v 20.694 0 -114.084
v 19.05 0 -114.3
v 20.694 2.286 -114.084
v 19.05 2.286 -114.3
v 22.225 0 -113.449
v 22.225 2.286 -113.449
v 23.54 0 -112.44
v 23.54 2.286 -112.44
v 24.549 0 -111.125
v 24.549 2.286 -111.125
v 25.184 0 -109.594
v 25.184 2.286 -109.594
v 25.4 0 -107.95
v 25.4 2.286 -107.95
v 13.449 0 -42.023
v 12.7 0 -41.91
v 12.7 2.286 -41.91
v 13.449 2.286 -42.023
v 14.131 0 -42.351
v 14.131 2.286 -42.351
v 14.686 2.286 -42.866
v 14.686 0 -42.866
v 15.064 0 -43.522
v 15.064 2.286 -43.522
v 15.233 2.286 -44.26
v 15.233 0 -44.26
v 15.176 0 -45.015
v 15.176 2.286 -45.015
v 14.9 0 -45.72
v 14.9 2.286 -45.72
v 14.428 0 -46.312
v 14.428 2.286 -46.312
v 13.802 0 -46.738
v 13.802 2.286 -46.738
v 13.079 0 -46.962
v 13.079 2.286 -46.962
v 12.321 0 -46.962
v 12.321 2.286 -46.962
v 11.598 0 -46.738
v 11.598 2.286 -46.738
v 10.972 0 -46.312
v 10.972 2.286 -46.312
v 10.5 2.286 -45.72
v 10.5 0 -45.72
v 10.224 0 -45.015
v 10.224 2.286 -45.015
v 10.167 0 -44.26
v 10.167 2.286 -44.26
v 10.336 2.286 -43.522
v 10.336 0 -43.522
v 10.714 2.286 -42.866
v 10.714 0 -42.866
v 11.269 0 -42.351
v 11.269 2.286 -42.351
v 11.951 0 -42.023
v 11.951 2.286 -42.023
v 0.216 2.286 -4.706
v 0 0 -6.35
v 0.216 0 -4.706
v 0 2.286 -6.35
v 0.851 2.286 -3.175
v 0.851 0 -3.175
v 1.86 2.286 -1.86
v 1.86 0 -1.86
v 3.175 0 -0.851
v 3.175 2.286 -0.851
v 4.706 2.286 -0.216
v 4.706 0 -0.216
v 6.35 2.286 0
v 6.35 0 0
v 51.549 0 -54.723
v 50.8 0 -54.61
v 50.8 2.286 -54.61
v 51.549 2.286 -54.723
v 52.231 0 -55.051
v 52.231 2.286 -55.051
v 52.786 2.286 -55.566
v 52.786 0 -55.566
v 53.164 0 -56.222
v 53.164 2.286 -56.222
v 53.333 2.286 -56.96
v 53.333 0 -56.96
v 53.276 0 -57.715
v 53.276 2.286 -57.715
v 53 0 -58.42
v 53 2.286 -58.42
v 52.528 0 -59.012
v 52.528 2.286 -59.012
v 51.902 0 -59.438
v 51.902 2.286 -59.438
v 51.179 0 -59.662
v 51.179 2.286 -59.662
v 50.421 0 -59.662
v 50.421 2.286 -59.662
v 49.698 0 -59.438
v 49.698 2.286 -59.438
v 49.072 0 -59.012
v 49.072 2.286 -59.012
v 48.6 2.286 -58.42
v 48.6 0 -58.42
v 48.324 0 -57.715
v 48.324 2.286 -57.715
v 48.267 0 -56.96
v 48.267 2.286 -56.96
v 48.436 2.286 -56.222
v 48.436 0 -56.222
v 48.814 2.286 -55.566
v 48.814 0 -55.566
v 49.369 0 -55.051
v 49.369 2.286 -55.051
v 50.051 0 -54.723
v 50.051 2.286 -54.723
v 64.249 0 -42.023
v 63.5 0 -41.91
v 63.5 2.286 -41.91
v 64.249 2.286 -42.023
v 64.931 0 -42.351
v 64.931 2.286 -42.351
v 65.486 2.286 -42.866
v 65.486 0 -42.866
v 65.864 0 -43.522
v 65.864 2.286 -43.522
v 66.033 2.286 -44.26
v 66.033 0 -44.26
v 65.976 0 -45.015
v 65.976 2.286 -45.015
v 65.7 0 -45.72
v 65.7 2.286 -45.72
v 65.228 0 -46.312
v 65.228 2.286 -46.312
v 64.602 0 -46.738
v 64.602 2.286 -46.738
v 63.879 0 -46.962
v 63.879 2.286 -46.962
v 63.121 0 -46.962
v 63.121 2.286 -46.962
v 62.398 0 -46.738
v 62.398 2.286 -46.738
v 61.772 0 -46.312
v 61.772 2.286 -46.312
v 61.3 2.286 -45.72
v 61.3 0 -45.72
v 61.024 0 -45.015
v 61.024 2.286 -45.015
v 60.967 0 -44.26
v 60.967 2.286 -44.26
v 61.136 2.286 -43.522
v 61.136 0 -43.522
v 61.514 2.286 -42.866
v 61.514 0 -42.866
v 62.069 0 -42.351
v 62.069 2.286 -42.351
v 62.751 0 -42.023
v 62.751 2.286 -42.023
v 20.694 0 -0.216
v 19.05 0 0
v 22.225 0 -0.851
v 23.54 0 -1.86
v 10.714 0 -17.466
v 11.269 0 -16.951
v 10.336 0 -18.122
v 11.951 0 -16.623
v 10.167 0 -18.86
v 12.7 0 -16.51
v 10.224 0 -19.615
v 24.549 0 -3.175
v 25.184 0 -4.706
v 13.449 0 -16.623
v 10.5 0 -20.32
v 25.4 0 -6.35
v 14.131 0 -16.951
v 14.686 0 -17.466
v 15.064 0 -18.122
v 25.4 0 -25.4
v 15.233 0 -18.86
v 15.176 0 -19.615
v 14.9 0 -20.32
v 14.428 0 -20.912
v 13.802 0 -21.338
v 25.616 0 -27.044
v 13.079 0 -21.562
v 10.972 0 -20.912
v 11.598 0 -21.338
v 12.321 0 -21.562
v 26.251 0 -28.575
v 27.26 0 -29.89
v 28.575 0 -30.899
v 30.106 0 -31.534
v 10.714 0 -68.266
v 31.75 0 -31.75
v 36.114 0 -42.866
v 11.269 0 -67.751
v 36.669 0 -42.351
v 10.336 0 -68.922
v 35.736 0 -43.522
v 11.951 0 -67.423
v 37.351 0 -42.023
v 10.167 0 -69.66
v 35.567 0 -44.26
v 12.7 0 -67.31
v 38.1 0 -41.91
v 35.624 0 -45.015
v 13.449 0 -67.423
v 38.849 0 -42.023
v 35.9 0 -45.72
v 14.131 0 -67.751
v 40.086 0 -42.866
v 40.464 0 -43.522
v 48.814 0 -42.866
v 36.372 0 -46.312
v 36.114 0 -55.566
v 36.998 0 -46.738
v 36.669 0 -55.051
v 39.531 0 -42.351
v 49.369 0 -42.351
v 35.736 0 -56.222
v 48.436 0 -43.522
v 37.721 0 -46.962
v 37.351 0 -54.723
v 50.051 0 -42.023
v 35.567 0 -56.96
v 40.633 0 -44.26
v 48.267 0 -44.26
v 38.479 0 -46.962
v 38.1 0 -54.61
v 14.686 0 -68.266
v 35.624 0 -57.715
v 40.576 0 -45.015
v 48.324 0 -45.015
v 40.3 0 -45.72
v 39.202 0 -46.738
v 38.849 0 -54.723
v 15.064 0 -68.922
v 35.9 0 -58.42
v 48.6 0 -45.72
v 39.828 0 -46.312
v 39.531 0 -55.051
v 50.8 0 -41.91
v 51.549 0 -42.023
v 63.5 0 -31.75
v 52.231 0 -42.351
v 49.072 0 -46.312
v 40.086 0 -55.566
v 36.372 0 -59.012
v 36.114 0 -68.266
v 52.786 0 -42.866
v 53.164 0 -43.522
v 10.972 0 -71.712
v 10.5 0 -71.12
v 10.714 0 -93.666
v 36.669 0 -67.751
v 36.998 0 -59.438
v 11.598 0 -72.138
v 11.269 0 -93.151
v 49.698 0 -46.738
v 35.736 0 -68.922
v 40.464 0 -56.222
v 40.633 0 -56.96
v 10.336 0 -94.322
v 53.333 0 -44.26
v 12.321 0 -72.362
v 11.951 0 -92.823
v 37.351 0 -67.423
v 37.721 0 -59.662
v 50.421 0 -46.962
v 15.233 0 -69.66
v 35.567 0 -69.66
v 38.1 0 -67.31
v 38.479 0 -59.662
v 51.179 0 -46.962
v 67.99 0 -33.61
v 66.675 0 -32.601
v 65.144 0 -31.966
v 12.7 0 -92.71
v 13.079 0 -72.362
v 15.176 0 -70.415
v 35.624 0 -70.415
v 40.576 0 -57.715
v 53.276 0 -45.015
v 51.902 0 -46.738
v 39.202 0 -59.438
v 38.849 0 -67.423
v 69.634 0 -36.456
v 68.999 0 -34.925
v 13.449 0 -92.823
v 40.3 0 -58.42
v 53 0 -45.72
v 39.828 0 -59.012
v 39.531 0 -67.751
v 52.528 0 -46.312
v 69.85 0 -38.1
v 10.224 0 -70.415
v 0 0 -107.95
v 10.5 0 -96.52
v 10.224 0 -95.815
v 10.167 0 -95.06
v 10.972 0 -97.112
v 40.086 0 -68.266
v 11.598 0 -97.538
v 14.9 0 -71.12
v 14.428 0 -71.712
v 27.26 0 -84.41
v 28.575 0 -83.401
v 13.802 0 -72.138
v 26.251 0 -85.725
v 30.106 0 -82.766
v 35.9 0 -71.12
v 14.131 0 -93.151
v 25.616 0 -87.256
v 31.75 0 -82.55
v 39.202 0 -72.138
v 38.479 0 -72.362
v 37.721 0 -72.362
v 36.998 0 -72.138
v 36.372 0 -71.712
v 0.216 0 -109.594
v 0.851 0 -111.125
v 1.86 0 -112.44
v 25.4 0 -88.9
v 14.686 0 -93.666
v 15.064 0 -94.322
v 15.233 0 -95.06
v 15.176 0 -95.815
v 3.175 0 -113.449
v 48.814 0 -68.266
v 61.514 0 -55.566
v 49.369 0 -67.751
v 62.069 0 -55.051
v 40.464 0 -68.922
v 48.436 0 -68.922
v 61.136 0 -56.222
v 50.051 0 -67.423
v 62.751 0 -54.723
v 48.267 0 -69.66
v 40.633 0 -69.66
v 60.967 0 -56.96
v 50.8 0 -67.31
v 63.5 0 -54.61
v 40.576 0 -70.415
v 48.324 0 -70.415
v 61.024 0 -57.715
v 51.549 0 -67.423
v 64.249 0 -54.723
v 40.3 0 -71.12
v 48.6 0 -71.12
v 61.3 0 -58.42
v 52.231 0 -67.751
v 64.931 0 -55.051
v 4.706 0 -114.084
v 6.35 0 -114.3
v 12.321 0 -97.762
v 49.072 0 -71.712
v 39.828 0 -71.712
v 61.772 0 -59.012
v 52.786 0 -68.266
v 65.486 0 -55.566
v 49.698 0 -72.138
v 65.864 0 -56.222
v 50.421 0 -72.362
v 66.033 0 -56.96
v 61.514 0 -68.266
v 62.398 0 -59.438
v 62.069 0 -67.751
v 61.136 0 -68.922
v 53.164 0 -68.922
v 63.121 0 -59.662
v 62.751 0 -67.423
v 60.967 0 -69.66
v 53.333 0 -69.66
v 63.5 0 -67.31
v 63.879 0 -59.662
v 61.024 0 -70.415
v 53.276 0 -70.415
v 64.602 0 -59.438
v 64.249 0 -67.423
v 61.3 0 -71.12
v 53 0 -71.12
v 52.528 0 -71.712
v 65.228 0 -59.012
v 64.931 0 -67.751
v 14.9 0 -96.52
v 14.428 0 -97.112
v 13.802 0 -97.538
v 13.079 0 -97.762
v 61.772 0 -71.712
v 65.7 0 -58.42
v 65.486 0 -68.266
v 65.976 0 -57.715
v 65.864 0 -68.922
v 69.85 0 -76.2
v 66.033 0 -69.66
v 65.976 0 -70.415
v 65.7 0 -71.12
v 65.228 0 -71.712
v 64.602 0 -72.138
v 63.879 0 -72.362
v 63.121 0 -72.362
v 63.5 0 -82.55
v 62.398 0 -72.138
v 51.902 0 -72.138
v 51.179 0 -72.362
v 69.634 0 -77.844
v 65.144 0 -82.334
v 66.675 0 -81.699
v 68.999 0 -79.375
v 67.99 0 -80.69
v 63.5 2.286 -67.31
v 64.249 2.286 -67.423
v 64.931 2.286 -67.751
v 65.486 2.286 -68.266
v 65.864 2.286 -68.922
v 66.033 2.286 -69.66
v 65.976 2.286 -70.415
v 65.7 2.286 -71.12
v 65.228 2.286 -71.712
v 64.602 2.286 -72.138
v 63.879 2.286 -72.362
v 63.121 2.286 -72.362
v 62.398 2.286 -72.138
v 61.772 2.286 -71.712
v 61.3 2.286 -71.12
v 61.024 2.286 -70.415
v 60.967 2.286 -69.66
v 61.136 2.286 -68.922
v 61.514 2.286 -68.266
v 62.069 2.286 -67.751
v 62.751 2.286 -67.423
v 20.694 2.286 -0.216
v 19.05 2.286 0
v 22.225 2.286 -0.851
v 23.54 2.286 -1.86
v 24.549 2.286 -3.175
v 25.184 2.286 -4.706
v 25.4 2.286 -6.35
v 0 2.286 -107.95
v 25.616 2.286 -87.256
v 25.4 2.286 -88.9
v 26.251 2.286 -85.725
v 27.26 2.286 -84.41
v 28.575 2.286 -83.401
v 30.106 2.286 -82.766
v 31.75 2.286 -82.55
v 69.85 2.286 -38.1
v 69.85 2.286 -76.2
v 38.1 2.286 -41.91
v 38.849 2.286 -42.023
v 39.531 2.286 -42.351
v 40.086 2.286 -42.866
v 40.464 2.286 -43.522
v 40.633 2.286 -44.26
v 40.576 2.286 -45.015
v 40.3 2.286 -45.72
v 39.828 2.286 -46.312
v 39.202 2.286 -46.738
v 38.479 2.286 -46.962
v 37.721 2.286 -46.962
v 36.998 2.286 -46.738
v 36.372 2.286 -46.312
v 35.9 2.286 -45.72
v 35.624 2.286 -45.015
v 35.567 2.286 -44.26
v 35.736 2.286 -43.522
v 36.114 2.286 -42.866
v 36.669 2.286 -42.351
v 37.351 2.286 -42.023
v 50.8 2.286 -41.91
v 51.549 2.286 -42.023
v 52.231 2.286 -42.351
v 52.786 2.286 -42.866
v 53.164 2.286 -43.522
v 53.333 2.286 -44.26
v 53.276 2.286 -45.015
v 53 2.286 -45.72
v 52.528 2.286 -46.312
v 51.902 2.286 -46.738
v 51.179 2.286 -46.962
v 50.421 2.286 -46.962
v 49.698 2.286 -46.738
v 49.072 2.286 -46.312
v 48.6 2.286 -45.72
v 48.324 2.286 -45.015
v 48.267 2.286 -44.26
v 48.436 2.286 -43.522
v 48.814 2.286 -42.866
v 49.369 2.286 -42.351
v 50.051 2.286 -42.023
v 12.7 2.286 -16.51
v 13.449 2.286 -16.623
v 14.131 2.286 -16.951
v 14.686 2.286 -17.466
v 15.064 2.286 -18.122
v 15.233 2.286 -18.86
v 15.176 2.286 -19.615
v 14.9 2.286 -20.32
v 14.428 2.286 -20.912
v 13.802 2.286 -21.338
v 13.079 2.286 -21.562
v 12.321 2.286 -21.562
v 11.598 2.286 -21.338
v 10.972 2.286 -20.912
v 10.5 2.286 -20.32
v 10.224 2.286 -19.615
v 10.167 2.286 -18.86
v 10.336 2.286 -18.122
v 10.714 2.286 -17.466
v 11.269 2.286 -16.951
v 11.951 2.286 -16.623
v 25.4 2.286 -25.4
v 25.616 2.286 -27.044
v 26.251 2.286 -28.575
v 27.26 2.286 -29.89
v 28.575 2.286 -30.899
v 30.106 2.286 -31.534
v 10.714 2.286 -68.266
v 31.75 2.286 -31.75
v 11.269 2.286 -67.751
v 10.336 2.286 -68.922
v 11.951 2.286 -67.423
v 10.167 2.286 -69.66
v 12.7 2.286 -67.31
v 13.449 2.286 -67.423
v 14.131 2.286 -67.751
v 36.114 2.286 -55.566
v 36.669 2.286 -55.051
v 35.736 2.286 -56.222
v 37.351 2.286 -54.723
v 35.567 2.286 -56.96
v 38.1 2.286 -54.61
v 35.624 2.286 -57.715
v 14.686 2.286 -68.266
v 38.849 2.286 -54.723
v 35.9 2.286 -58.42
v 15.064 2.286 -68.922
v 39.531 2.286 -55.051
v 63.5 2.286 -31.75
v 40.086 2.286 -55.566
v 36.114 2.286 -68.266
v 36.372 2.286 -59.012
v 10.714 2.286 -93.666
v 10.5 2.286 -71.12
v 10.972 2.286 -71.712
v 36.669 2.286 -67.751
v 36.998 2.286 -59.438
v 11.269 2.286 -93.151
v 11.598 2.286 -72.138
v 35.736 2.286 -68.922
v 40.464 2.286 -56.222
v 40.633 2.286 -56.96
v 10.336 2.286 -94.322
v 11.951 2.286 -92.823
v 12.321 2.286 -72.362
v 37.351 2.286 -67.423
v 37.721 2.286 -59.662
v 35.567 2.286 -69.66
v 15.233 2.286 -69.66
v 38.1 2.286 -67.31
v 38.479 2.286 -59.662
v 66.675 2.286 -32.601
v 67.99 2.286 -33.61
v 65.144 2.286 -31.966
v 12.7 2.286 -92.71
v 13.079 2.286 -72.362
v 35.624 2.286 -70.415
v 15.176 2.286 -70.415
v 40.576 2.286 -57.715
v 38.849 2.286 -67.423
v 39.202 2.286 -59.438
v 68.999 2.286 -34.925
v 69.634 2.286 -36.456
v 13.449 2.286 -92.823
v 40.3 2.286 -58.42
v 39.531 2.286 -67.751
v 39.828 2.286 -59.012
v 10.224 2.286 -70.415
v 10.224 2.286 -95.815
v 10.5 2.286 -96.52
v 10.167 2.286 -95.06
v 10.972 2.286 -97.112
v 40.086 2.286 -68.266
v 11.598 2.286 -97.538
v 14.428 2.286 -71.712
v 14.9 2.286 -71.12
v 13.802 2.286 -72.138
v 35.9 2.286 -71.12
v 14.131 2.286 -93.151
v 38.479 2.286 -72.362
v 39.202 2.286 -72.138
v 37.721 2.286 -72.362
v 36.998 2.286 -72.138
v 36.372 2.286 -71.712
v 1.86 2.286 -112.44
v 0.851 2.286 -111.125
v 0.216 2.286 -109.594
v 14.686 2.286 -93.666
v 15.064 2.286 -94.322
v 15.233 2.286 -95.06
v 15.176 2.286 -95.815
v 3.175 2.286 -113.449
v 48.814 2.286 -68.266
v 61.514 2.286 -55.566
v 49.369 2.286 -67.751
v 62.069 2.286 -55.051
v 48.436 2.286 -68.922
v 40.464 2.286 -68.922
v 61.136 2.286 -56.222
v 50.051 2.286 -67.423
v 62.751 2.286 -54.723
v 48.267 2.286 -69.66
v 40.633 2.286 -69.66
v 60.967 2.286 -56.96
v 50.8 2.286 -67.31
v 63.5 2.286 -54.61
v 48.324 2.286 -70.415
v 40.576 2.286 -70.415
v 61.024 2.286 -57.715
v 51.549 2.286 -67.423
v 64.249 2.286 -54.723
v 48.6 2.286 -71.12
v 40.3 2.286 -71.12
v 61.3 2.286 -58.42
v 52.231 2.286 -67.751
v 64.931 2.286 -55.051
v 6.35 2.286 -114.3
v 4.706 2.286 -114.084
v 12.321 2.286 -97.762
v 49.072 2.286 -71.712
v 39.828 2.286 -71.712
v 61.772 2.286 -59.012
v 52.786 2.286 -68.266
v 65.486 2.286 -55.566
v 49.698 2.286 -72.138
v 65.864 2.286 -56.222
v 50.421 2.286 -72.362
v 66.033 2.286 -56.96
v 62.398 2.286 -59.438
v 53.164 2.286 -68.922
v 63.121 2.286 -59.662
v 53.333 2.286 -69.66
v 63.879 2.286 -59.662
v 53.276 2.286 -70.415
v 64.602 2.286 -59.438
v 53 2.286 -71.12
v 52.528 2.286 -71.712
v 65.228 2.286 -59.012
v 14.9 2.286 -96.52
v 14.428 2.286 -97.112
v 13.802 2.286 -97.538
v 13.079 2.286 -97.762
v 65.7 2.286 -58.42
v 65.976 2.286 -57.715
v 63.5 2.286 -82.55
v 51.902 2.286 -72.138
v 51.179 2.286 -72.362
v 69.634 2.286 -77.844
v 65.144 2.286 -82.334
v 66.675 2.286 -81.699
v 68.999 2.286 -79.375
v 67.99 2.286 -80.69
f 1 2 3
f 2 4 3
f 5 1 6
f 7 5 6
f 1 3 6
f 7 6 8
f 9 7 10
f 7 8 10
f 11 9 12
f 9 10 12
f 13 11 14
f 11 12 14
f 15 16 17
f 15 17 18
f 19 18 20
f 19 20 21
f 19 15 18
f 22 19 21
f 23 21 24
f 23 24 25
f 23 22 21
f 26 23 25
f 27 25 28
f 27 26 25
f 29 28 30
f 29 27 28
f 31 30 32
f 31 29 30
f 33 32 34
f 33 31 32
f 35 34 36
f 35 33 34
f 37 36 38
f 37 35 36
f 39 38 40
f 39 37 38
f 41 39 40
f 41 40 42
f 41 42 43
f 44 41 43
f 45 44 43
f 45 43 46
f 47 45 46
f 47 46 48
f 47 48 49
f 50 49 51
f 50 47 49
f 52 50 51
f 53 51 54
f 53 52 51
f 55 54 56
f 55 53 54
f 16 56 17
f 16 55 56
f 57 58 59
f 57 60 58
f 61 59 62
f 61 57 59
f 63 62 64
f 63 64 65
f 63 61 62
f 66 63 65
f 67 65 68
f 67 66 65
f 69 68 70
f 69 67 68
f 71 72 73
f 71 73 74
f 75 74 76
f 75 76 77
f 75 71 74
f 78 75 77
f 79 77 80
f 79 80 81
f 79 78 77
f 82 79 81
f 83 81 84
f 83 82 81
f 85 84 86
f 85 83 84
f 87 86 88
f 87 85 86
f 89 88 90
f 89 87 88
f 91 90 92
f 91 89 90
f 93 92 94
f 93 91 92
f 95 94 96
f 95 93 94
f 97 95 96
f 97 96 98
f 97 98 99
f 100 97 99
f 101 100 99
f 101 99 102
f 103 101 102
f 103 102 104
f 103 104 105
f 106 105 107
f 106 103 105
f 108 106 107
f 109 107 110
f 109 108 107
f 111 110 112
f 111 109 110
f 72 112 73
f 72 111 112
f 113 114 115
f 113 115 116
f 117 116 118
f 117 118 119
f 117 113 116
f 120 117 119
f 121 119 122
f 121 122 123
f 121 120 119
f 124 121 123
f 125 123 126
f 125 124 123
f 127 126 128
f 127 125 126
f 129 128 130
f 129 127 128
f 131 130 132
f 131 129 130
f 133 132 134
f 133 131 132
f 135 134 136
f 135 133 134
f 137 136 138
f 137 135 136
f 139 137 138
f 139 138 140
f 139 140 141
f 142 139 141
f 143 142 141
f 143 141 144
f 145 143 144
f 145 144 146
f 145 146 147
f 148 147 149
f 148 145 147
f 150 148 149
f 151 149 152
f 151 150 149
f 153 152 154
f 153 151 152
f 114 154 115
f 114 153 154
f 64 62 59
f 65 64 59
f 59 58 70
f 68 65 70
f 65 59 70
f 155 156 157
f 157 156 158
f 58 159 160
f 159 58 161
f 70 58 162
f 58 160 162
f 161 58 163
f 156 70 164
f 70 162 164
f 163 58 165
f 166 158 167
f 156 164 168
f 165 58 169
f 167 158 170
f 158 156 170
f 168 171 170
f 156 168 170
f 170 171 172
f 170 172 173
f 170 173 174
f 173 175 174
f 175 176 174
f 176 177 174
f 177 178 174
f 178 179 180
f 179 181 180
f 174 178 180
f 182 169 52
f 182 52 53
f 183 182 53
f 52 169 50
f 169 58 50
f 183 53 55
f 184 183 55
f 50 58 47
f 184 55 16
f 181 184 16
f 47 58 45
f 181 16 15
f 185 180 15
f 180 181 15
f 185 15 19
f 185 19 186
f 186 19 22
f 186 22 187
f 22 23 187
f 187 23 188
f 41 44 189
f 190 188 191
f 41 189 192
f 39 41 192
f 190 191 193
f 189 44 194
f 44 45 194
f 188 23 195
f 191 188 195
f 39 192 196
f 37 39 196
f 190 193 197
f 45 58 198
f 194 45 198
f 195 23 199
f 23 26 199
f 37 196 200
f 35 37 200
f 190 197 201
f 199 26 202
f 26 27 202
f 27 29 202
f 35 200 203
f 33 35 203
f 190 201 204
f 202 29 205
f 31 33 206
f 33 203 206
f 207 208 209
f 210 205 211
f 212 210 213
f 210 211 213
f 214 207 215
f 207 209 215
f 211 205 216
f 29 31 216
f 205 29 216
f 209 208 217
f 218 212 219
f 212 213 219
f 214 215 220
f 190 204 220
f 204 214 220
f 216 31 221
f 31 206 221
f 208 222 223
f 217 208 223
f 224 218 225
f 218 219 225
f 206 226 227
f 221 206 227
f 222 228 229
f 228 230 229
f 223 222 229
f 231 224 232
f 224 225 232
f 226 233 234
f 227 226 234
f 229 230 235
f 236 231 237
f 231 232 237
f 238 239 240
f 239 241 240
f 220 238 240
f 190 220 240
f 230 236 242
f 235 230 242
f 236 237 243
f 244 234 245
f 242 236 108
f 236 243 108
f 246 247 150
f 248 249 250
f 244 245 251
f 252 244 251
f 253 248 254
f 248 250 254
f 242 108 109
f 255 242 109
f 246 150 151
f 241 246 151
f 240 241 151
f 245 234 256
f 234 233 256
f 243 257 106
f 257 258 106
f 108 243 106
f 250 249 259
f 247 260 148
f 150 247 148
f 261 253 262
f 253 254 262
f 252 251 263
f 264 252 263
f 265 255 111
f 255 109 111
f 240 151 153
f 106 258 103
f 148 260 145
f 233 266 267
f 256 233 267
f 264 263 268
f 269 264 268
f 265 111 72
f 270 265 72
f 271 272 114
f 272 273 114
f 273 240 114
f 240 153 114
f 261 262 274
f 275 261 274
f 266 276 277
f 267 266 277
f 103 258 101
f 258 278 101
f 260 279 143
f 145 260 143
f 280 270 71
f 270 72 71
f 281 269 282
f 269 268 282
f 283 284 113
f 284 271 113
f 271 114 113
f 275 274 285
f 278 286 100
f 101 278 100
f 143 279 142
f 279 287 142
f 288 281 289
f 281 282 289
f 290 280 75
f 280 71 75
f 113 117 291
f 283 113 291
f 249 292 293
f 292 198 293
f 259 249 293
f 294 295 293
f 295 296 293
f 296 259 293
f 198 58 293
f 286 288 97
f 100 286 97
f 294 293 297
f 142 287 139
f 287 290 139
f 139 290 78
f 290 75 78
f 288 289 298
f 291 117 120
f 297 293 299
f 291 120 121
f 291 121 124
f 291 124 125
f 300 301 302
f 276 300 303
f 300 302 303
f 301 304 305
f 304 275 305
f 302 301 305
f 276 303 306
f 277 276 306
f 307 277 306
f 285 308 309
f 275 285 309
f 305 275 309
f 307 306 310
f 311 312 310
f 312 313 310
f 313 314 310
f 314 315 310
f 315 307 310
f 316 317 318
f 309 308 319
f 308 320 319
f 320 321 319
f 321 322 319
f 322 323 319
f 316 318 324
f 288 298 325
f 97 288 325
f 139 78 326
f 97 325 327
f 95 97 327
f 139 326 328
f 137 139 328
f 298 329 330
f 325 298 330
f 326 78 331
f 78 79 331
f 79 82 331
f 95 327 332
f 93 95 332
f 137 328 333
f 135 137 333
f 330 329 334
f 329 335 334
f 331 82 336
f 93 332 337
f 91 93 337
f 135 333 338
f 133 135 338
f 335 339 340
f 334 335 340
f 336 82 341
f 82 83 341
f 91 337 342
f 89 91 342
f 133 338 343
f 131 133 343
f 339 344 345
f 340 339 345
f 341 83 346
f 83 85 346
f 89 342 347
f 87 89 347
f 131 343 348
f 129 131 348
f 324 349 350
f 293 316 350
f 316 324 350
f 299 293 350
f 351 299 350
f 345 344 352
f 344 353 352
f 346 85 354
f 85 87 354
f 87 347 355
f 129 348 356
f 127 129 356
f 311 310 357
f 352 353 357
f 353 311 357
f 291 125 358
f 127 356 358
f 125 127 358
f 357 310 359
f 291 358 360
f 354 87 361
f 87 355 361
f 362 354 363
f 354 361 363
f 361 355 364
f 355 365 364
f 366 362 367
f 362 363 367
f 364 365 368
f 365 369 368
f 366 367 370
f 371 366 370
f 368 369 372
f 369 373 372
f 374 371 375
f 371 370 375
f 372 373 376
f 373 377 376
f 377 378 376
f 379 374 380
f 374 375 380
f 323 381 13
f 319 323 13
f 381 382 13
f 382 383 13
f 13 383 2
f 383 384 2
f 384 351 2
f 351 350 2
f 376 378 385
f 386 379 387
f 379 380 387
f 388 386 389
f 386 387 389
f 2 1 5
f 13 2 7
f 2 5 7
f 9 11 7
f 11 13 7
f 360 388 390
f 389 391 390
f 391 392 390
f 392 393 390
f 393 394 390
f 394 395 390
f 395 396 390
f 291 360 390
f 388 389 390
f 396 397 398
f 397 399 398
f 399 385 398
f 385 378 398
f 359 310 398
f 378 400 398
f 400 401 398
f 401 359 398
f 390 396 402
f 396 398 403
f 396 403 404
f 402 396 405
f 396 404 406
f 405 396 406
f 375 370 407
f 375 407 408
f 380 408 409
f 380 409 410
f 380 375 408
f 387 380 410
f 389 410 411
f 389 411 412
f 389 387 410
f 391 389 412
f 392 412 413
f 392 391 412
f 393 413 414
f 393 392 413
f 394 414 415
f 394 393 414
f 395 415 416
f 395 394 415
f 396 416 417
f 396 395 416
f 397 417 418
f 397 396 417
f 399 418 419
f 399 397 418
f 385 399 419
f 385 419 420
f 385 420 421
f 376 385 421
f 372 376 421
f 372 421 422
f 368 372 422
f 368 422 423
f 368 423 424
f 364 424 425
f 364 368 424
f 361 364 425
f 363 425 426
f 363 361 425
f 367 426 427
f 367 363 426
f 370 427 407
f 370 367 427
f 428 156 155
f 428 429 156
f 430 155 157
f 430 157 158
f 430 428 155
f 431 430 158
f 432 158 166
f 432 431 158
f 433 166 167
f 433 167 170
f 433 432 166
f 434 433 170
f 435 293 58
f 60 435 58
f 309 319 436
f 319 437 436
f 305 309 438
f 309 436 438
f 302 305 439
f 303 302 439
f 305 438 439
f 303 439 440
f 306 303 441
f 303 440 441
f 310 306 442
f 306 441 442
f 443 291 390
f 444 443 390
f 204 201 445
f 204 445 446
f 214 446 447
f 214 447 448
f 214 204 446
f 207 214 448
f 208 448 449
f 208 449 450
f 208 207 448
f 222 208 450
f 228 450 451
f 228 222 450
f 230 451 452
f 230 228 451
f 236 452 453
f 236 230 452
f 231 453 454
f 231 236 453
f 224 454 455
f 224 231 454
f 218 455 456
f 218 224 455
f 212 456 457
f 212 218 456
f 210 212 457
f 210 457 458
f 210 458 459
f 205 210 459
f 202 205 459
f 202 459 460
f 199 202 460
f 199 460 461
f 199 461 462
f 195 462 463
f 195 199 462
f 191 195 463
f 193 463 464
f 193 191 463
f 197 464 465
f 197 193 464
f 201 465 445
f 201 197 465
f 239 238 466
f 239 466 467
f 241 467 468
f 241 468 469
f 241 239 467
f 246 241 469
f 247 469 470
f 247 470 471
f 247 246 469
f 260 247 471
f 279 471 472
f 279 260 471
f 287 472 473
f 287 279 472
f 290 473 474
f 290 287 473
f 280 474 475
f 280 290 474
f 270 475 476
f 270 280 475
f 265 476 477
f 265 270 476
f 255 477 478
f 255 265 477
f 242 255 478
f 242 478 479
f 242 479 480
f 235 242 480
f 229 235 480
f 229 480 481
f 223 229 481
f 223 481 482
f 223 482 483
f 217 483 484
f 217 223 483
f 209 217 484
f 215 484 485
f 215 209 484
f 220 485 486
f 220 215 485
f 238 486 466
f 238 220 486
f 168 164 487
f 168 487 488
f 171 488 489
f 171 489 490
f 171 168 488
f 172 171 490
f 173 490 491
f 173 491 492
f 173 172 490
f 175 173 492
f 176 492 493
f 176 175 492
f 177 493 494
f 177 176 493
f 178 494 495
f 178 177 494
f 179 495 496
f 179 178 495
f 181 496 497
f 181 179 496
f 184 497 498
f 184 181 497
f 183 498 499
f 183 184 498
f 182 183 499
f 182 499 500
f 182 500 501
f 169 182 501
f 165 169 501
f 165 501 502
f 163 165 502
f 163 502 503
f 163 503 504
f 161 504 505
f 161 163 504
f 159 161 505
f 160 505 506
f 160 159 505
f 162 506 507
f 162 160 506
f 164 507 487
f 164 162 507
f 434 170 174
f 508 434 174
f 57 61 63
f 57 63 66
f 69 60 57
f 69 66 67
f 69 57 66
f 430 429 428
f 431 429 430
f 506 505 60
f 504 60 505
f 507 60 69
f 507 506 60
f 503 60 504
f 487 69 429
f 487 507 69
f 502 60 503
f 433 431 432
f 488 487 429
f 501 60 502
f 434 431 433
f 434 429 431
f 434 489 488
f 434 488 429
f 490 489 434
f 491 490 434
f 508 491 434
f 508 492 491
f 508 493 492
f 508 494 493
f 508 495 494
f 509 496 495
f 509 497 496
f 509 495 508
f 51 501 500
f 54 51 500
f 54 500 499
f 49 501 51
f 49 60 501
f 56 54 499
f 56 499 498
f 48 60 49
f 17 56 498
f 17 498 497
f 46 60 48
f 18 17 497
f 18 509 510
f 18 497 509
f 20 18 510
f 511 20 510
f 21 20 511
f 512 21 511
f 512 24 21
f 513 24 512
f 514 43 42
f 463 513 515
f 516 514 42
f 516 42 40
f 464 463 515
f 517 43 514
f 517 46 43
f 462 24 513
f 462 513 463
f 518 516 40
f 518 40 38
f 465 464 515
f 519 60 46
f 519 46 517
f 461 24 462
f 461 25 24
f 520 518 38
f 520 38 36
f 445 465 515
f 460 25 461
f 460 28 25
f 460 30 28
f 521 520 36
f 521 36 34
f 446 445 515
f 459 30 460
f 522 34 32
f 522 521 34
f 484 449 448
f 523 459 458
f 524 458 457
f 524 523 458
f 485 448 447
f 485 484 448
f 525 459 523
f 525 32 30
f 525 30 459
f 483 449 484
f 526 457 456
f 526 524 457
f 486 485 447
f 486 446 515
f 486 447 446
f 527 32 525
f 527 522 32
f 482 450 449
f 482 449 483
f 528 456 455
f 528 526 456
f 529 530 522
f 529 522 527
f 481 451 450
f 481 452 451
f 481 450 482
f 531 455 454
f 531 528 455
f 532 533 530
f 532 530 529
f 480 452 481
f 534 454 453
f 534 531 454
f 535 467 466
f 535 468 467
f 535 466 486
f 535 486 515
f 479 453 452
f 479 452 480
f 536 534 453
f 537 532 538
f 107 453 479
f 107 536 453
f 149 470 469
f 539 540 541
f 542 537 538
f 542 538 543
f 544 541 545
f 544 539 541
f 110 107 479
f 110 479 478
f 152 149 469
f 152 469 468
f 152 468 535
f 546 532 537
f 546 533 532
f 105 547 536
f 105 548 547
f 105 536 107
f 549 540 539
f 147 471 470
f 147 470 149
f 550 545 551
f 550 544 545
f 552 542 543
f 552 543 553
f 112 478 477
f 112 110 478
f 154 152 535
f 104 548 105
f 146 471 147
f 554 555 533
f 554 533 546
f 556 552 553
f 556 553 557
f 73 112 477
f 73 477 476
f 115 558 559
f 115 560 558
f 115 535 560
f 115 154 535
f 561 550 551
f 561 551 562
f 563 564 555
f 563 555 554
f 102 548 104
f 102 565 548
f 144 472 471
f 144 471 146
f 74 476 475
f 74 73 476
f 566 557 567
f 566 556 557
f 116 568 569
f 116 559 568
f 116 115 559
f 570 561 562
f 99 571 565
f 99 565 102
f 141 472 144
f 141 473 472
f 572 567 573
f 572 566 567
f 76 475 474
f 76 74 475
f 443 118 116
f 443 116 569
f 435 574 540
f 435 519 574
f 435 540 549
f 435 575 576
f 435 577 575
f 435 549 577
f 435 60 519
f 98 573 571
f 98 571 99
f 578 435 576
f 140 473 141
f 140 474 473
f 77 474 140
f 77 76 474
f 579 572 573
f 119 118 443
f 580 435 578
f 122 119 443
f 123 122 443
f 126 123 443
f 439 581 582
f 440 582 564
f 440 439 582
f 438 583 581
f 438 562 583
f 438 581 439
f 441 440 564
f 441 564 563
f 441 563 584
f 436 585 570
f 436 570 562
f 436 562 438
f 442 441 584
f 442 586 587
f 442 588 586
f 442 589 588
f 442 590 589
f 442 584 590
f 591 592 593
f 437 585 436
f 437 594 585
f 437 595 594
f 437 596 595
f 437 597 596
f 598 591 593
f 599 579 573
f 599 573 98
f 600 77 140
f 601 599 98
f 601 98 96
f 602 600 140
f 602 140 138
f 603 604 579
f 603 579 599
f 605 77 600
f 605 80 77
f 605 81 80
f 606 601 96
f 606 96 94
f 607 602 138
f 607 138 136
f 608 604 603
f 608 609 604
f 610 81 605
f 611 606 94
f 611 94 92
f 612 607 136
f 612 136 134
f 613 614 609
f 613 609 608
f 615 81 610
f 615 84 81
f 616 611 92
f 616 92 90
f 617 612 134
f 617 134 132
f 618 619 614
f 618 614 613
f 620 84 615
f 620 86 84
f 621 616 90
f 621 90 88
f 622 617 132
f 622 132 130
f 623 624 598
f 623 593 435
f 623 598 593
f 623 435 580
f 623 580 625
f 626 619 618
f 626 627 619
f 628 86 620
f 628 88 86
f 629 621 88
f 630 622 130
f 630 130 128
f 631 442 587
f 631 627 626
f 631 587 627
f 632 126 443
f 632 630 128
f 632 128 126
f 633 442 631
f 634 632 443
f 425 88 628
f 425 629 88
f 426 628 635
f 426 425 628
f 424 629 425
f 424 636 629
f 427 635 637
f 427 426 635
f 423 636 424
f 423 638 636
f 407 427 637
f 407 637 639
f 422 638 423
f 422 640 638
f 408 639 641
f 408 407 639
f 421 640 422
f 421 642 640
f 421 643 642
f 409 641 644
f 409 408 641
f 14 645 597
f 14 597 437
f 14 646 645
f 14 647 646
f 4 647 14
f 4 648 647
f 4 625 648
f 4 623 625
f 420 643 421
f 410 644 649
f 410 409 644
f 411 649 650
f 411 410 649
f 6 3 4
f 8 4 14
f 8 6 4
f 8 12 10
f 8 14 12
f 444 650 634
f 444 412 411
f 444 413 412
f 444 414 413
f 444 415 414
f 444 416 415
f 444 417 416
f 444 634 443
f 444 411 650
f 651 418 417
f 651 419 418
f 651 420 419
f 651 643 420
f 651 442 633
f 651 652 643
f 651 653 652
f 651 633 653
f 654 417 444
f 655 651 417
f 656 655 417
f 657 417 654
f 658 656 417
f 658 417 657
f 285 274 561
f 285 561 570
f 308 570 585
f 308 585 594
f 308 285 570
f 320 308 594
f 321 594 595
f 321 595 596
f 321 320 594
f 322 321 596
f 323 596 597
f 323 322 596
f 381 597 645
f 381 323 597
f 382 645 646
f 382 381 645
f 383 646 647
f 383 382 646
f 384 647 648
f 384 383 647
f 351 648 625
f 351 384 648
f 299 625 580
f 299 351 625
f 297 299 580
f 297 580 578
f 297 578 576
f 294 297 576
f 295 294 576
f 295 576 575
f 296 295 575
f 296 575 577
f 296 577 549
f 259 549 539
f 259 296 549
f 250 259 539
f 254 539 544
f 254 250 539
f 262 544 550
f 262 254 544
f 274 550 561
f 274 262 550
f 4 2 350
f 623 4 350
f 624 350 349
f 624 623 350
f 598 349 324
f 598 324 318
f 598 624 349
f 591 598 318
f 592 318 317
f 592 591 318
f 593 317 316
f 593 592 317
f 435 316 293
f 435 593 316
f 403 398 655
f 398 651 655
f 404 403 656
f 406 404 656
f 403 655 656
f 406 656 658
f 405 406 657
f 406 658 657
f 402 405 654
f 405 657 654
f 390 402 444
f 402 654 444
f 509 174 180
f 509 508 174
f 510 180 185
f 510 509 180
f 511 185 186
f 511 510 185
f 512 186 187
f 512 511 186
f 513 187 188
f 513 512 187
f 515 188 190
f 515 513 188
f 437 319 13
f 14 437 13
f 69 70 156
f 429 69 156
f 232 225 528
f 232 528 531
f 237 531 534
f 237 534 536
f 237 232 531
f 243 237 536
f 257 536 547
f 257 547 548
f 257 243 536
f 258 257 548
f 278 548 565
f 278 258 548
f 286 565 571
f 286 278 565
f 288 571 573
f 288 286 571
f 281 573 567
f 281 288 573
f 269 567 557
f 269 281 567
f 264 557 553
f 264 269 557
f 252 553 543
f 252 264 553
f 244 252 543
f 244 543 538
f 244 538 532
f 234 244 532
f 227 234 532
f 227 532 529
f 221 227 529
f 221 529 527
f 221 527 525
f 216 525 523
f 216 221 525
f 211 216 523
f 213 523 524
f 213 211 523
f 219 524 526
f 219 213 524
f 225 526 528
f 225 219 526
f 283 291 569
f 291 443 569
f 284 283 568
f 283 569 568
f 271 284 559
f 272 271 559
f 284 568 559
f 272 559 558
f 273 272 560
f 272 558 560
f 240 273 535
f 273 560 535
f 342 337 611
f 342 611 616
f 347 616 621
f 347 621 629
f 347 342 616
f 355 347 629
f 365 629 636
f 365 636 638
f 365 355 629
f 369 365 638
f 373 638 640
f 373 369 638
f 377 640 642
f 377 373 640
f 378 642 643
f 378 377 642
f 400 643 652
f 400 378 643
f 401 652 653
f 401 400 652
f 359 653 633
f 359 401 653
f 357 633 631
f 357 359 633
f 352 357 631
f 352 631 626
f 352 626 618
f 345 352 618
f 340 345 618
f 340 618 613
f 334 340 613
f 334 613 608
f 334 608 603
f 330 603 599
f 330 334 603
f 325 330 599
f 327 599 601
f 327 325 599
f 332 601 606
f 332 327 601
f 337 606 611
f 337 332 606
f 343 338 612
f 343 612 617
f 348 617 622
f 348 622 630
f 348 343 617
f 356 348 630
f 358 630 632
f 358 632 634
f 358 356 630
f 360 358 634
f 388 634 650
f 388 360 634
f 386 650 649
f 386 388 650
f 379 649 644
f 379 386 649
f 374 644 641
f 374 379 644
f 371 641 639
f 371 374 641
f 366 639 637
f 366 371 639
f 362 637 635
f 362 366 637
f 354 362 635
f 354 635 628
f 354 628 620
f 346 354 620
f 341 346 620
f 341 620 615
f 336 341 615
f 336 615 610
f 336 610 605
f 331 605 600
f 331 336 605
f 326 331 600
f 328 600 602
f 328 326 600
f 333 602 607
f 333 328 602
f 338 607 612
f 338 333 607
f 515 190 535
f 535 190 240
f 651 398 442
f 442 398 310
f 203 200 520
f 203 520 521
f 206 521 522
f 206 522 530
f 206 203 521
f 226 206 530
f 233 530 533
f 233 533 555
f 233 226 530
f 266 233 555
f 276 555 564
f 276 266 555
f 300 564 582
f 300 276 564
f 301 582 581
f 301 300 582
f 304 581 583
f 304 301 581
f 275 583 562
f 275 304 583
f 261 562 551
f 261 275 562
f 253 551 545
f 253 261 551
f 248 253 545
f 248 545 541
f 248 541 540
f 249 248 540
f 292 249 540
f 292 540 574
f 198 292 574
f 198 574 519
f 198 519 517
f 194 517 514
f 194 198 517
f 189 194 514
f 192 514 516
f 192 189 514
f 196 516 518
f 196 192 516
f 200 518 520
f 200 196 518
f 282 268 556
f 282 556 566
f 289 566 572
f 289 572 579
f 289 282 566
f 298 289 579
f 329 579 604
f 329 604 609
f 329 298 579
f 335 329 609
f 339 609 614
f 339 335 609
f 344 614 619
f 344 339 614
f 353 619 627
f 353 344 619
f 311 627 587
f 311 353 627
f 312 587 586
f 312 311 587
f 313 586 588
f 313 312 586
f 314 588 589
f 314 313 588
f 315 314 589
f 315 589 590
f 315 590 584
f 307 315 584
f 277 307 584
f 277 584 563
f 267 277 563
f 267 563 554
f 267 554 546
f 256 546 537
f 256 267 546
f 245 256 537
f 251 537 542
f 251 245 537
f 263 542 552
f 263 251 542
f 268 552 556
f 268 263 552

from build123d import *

# Parameters (mm, degrees)
SKETCH1_R           = 2.54
BOSS_EXTRUDE1_DEPTH = 2.286
FILLET1_R           = 6.35


with BuildPart() as part:
    # Sketch1 → Boss-Extrude1 (new body)
    with BuildSketch(Plane(origin=(0, 0, 0), x_dir=(1, 0, 0), z_dir=(0, 1, 0))):
        Polygon((25.4, 114.3), (0, 114.3), (0, 0), (25.4, 0), (25.4, 31.75), (69.85, 31.75), (69.85, 82.55), (25.4, 82.55), align=None)
        with Locations(Location((12.7, 95.25, 0), (0, 0, 270))):
            Circle(SKETCH1_R, mode=Mode.SUBTRACT)
        with Locations(Location((12.7, 69.85, 0), (0, 0, 270))):
            Circle(SKETCH1_R, mode=Mode.SUBTRACT)
        with Locations(Location((12.7, 44.45, 0), (0, 0, 270))):
            Circle(SKETCH1_R, mode=Mode.SUBTRACT)
        with Locations(Location((12.7, 19.05, 0), (0, 0, 270))):
            Circle(SKETCH1_R, mode=Mode.SUBTRACT)
        with Locations(Location((38.1, 69.85, 0), (0, 0, 270))):
            Circle(SKETCH1_R, mode=Mode.SUBTRACT)
        with Locations(Location((50.8, 69.85, 0), (0, 0, 270))):
            Circle(SKETCH1_R, mode=Mode.SUBTRACT)
        with Locations(Location((63.5, 69.85, 0), (0, 0, 270))):
            Circle(SKETCH1_R, mode=Mode.SUBTRACT)
        with Locations(Location((50.8, 57.15, 0), (0, 0, 270))):
            Circle(SKETCH1_R, mode=Mode.SUBTRACT)
        with Locations(Location((63.5, 57.15, 0), (0, 0, 270))):
            Circle(SKETCH1_R, mode=Mode.SUBTRACT)
        with Locations(Location((50.8, 44.45, 0), (0, 0, 270))):
            Circle(SKETCH1_R, mode=Mode.SUBTRACT)
        with Locations(Location((63.5, 44.45, 0), (0, 0, 270))):
            Circle(SKETCH1_R, mode=Mode.SUBTRACT)
        with Locations(Location((38.1, 57.15, 0), (0, 0, 270))):
            Circle(SKETCH1_R, mode=Mode.SUBTRACT)
        with Locations(Location((38.1, 44.45, 0), (0, 0, 270))):
            Circle(SKETCH1_R, mode=Mode.SUBTRACT)
    extrude(amount=BOSS_EXTRUDE1_DEPTH)

    # Fillet1
    fillet1_edges = [part.edges().sort_by_distance(p)[0] for p in [
        (25.4, 1.143, -82.55),
        (69.85, 1.143, -82.55),
        (69.85, 1.143, -31.75),
        (25.4, 1.143, -31.75),
        (25.4, 1.143, 0),
        (0, 1.143, 0),
        (0, 1.143, -114.3),
        (25.4, 1.143, -114.3),
    ]]
    fillet(fillet1_edges, radius=FILLET1_R)


solid = part.part
